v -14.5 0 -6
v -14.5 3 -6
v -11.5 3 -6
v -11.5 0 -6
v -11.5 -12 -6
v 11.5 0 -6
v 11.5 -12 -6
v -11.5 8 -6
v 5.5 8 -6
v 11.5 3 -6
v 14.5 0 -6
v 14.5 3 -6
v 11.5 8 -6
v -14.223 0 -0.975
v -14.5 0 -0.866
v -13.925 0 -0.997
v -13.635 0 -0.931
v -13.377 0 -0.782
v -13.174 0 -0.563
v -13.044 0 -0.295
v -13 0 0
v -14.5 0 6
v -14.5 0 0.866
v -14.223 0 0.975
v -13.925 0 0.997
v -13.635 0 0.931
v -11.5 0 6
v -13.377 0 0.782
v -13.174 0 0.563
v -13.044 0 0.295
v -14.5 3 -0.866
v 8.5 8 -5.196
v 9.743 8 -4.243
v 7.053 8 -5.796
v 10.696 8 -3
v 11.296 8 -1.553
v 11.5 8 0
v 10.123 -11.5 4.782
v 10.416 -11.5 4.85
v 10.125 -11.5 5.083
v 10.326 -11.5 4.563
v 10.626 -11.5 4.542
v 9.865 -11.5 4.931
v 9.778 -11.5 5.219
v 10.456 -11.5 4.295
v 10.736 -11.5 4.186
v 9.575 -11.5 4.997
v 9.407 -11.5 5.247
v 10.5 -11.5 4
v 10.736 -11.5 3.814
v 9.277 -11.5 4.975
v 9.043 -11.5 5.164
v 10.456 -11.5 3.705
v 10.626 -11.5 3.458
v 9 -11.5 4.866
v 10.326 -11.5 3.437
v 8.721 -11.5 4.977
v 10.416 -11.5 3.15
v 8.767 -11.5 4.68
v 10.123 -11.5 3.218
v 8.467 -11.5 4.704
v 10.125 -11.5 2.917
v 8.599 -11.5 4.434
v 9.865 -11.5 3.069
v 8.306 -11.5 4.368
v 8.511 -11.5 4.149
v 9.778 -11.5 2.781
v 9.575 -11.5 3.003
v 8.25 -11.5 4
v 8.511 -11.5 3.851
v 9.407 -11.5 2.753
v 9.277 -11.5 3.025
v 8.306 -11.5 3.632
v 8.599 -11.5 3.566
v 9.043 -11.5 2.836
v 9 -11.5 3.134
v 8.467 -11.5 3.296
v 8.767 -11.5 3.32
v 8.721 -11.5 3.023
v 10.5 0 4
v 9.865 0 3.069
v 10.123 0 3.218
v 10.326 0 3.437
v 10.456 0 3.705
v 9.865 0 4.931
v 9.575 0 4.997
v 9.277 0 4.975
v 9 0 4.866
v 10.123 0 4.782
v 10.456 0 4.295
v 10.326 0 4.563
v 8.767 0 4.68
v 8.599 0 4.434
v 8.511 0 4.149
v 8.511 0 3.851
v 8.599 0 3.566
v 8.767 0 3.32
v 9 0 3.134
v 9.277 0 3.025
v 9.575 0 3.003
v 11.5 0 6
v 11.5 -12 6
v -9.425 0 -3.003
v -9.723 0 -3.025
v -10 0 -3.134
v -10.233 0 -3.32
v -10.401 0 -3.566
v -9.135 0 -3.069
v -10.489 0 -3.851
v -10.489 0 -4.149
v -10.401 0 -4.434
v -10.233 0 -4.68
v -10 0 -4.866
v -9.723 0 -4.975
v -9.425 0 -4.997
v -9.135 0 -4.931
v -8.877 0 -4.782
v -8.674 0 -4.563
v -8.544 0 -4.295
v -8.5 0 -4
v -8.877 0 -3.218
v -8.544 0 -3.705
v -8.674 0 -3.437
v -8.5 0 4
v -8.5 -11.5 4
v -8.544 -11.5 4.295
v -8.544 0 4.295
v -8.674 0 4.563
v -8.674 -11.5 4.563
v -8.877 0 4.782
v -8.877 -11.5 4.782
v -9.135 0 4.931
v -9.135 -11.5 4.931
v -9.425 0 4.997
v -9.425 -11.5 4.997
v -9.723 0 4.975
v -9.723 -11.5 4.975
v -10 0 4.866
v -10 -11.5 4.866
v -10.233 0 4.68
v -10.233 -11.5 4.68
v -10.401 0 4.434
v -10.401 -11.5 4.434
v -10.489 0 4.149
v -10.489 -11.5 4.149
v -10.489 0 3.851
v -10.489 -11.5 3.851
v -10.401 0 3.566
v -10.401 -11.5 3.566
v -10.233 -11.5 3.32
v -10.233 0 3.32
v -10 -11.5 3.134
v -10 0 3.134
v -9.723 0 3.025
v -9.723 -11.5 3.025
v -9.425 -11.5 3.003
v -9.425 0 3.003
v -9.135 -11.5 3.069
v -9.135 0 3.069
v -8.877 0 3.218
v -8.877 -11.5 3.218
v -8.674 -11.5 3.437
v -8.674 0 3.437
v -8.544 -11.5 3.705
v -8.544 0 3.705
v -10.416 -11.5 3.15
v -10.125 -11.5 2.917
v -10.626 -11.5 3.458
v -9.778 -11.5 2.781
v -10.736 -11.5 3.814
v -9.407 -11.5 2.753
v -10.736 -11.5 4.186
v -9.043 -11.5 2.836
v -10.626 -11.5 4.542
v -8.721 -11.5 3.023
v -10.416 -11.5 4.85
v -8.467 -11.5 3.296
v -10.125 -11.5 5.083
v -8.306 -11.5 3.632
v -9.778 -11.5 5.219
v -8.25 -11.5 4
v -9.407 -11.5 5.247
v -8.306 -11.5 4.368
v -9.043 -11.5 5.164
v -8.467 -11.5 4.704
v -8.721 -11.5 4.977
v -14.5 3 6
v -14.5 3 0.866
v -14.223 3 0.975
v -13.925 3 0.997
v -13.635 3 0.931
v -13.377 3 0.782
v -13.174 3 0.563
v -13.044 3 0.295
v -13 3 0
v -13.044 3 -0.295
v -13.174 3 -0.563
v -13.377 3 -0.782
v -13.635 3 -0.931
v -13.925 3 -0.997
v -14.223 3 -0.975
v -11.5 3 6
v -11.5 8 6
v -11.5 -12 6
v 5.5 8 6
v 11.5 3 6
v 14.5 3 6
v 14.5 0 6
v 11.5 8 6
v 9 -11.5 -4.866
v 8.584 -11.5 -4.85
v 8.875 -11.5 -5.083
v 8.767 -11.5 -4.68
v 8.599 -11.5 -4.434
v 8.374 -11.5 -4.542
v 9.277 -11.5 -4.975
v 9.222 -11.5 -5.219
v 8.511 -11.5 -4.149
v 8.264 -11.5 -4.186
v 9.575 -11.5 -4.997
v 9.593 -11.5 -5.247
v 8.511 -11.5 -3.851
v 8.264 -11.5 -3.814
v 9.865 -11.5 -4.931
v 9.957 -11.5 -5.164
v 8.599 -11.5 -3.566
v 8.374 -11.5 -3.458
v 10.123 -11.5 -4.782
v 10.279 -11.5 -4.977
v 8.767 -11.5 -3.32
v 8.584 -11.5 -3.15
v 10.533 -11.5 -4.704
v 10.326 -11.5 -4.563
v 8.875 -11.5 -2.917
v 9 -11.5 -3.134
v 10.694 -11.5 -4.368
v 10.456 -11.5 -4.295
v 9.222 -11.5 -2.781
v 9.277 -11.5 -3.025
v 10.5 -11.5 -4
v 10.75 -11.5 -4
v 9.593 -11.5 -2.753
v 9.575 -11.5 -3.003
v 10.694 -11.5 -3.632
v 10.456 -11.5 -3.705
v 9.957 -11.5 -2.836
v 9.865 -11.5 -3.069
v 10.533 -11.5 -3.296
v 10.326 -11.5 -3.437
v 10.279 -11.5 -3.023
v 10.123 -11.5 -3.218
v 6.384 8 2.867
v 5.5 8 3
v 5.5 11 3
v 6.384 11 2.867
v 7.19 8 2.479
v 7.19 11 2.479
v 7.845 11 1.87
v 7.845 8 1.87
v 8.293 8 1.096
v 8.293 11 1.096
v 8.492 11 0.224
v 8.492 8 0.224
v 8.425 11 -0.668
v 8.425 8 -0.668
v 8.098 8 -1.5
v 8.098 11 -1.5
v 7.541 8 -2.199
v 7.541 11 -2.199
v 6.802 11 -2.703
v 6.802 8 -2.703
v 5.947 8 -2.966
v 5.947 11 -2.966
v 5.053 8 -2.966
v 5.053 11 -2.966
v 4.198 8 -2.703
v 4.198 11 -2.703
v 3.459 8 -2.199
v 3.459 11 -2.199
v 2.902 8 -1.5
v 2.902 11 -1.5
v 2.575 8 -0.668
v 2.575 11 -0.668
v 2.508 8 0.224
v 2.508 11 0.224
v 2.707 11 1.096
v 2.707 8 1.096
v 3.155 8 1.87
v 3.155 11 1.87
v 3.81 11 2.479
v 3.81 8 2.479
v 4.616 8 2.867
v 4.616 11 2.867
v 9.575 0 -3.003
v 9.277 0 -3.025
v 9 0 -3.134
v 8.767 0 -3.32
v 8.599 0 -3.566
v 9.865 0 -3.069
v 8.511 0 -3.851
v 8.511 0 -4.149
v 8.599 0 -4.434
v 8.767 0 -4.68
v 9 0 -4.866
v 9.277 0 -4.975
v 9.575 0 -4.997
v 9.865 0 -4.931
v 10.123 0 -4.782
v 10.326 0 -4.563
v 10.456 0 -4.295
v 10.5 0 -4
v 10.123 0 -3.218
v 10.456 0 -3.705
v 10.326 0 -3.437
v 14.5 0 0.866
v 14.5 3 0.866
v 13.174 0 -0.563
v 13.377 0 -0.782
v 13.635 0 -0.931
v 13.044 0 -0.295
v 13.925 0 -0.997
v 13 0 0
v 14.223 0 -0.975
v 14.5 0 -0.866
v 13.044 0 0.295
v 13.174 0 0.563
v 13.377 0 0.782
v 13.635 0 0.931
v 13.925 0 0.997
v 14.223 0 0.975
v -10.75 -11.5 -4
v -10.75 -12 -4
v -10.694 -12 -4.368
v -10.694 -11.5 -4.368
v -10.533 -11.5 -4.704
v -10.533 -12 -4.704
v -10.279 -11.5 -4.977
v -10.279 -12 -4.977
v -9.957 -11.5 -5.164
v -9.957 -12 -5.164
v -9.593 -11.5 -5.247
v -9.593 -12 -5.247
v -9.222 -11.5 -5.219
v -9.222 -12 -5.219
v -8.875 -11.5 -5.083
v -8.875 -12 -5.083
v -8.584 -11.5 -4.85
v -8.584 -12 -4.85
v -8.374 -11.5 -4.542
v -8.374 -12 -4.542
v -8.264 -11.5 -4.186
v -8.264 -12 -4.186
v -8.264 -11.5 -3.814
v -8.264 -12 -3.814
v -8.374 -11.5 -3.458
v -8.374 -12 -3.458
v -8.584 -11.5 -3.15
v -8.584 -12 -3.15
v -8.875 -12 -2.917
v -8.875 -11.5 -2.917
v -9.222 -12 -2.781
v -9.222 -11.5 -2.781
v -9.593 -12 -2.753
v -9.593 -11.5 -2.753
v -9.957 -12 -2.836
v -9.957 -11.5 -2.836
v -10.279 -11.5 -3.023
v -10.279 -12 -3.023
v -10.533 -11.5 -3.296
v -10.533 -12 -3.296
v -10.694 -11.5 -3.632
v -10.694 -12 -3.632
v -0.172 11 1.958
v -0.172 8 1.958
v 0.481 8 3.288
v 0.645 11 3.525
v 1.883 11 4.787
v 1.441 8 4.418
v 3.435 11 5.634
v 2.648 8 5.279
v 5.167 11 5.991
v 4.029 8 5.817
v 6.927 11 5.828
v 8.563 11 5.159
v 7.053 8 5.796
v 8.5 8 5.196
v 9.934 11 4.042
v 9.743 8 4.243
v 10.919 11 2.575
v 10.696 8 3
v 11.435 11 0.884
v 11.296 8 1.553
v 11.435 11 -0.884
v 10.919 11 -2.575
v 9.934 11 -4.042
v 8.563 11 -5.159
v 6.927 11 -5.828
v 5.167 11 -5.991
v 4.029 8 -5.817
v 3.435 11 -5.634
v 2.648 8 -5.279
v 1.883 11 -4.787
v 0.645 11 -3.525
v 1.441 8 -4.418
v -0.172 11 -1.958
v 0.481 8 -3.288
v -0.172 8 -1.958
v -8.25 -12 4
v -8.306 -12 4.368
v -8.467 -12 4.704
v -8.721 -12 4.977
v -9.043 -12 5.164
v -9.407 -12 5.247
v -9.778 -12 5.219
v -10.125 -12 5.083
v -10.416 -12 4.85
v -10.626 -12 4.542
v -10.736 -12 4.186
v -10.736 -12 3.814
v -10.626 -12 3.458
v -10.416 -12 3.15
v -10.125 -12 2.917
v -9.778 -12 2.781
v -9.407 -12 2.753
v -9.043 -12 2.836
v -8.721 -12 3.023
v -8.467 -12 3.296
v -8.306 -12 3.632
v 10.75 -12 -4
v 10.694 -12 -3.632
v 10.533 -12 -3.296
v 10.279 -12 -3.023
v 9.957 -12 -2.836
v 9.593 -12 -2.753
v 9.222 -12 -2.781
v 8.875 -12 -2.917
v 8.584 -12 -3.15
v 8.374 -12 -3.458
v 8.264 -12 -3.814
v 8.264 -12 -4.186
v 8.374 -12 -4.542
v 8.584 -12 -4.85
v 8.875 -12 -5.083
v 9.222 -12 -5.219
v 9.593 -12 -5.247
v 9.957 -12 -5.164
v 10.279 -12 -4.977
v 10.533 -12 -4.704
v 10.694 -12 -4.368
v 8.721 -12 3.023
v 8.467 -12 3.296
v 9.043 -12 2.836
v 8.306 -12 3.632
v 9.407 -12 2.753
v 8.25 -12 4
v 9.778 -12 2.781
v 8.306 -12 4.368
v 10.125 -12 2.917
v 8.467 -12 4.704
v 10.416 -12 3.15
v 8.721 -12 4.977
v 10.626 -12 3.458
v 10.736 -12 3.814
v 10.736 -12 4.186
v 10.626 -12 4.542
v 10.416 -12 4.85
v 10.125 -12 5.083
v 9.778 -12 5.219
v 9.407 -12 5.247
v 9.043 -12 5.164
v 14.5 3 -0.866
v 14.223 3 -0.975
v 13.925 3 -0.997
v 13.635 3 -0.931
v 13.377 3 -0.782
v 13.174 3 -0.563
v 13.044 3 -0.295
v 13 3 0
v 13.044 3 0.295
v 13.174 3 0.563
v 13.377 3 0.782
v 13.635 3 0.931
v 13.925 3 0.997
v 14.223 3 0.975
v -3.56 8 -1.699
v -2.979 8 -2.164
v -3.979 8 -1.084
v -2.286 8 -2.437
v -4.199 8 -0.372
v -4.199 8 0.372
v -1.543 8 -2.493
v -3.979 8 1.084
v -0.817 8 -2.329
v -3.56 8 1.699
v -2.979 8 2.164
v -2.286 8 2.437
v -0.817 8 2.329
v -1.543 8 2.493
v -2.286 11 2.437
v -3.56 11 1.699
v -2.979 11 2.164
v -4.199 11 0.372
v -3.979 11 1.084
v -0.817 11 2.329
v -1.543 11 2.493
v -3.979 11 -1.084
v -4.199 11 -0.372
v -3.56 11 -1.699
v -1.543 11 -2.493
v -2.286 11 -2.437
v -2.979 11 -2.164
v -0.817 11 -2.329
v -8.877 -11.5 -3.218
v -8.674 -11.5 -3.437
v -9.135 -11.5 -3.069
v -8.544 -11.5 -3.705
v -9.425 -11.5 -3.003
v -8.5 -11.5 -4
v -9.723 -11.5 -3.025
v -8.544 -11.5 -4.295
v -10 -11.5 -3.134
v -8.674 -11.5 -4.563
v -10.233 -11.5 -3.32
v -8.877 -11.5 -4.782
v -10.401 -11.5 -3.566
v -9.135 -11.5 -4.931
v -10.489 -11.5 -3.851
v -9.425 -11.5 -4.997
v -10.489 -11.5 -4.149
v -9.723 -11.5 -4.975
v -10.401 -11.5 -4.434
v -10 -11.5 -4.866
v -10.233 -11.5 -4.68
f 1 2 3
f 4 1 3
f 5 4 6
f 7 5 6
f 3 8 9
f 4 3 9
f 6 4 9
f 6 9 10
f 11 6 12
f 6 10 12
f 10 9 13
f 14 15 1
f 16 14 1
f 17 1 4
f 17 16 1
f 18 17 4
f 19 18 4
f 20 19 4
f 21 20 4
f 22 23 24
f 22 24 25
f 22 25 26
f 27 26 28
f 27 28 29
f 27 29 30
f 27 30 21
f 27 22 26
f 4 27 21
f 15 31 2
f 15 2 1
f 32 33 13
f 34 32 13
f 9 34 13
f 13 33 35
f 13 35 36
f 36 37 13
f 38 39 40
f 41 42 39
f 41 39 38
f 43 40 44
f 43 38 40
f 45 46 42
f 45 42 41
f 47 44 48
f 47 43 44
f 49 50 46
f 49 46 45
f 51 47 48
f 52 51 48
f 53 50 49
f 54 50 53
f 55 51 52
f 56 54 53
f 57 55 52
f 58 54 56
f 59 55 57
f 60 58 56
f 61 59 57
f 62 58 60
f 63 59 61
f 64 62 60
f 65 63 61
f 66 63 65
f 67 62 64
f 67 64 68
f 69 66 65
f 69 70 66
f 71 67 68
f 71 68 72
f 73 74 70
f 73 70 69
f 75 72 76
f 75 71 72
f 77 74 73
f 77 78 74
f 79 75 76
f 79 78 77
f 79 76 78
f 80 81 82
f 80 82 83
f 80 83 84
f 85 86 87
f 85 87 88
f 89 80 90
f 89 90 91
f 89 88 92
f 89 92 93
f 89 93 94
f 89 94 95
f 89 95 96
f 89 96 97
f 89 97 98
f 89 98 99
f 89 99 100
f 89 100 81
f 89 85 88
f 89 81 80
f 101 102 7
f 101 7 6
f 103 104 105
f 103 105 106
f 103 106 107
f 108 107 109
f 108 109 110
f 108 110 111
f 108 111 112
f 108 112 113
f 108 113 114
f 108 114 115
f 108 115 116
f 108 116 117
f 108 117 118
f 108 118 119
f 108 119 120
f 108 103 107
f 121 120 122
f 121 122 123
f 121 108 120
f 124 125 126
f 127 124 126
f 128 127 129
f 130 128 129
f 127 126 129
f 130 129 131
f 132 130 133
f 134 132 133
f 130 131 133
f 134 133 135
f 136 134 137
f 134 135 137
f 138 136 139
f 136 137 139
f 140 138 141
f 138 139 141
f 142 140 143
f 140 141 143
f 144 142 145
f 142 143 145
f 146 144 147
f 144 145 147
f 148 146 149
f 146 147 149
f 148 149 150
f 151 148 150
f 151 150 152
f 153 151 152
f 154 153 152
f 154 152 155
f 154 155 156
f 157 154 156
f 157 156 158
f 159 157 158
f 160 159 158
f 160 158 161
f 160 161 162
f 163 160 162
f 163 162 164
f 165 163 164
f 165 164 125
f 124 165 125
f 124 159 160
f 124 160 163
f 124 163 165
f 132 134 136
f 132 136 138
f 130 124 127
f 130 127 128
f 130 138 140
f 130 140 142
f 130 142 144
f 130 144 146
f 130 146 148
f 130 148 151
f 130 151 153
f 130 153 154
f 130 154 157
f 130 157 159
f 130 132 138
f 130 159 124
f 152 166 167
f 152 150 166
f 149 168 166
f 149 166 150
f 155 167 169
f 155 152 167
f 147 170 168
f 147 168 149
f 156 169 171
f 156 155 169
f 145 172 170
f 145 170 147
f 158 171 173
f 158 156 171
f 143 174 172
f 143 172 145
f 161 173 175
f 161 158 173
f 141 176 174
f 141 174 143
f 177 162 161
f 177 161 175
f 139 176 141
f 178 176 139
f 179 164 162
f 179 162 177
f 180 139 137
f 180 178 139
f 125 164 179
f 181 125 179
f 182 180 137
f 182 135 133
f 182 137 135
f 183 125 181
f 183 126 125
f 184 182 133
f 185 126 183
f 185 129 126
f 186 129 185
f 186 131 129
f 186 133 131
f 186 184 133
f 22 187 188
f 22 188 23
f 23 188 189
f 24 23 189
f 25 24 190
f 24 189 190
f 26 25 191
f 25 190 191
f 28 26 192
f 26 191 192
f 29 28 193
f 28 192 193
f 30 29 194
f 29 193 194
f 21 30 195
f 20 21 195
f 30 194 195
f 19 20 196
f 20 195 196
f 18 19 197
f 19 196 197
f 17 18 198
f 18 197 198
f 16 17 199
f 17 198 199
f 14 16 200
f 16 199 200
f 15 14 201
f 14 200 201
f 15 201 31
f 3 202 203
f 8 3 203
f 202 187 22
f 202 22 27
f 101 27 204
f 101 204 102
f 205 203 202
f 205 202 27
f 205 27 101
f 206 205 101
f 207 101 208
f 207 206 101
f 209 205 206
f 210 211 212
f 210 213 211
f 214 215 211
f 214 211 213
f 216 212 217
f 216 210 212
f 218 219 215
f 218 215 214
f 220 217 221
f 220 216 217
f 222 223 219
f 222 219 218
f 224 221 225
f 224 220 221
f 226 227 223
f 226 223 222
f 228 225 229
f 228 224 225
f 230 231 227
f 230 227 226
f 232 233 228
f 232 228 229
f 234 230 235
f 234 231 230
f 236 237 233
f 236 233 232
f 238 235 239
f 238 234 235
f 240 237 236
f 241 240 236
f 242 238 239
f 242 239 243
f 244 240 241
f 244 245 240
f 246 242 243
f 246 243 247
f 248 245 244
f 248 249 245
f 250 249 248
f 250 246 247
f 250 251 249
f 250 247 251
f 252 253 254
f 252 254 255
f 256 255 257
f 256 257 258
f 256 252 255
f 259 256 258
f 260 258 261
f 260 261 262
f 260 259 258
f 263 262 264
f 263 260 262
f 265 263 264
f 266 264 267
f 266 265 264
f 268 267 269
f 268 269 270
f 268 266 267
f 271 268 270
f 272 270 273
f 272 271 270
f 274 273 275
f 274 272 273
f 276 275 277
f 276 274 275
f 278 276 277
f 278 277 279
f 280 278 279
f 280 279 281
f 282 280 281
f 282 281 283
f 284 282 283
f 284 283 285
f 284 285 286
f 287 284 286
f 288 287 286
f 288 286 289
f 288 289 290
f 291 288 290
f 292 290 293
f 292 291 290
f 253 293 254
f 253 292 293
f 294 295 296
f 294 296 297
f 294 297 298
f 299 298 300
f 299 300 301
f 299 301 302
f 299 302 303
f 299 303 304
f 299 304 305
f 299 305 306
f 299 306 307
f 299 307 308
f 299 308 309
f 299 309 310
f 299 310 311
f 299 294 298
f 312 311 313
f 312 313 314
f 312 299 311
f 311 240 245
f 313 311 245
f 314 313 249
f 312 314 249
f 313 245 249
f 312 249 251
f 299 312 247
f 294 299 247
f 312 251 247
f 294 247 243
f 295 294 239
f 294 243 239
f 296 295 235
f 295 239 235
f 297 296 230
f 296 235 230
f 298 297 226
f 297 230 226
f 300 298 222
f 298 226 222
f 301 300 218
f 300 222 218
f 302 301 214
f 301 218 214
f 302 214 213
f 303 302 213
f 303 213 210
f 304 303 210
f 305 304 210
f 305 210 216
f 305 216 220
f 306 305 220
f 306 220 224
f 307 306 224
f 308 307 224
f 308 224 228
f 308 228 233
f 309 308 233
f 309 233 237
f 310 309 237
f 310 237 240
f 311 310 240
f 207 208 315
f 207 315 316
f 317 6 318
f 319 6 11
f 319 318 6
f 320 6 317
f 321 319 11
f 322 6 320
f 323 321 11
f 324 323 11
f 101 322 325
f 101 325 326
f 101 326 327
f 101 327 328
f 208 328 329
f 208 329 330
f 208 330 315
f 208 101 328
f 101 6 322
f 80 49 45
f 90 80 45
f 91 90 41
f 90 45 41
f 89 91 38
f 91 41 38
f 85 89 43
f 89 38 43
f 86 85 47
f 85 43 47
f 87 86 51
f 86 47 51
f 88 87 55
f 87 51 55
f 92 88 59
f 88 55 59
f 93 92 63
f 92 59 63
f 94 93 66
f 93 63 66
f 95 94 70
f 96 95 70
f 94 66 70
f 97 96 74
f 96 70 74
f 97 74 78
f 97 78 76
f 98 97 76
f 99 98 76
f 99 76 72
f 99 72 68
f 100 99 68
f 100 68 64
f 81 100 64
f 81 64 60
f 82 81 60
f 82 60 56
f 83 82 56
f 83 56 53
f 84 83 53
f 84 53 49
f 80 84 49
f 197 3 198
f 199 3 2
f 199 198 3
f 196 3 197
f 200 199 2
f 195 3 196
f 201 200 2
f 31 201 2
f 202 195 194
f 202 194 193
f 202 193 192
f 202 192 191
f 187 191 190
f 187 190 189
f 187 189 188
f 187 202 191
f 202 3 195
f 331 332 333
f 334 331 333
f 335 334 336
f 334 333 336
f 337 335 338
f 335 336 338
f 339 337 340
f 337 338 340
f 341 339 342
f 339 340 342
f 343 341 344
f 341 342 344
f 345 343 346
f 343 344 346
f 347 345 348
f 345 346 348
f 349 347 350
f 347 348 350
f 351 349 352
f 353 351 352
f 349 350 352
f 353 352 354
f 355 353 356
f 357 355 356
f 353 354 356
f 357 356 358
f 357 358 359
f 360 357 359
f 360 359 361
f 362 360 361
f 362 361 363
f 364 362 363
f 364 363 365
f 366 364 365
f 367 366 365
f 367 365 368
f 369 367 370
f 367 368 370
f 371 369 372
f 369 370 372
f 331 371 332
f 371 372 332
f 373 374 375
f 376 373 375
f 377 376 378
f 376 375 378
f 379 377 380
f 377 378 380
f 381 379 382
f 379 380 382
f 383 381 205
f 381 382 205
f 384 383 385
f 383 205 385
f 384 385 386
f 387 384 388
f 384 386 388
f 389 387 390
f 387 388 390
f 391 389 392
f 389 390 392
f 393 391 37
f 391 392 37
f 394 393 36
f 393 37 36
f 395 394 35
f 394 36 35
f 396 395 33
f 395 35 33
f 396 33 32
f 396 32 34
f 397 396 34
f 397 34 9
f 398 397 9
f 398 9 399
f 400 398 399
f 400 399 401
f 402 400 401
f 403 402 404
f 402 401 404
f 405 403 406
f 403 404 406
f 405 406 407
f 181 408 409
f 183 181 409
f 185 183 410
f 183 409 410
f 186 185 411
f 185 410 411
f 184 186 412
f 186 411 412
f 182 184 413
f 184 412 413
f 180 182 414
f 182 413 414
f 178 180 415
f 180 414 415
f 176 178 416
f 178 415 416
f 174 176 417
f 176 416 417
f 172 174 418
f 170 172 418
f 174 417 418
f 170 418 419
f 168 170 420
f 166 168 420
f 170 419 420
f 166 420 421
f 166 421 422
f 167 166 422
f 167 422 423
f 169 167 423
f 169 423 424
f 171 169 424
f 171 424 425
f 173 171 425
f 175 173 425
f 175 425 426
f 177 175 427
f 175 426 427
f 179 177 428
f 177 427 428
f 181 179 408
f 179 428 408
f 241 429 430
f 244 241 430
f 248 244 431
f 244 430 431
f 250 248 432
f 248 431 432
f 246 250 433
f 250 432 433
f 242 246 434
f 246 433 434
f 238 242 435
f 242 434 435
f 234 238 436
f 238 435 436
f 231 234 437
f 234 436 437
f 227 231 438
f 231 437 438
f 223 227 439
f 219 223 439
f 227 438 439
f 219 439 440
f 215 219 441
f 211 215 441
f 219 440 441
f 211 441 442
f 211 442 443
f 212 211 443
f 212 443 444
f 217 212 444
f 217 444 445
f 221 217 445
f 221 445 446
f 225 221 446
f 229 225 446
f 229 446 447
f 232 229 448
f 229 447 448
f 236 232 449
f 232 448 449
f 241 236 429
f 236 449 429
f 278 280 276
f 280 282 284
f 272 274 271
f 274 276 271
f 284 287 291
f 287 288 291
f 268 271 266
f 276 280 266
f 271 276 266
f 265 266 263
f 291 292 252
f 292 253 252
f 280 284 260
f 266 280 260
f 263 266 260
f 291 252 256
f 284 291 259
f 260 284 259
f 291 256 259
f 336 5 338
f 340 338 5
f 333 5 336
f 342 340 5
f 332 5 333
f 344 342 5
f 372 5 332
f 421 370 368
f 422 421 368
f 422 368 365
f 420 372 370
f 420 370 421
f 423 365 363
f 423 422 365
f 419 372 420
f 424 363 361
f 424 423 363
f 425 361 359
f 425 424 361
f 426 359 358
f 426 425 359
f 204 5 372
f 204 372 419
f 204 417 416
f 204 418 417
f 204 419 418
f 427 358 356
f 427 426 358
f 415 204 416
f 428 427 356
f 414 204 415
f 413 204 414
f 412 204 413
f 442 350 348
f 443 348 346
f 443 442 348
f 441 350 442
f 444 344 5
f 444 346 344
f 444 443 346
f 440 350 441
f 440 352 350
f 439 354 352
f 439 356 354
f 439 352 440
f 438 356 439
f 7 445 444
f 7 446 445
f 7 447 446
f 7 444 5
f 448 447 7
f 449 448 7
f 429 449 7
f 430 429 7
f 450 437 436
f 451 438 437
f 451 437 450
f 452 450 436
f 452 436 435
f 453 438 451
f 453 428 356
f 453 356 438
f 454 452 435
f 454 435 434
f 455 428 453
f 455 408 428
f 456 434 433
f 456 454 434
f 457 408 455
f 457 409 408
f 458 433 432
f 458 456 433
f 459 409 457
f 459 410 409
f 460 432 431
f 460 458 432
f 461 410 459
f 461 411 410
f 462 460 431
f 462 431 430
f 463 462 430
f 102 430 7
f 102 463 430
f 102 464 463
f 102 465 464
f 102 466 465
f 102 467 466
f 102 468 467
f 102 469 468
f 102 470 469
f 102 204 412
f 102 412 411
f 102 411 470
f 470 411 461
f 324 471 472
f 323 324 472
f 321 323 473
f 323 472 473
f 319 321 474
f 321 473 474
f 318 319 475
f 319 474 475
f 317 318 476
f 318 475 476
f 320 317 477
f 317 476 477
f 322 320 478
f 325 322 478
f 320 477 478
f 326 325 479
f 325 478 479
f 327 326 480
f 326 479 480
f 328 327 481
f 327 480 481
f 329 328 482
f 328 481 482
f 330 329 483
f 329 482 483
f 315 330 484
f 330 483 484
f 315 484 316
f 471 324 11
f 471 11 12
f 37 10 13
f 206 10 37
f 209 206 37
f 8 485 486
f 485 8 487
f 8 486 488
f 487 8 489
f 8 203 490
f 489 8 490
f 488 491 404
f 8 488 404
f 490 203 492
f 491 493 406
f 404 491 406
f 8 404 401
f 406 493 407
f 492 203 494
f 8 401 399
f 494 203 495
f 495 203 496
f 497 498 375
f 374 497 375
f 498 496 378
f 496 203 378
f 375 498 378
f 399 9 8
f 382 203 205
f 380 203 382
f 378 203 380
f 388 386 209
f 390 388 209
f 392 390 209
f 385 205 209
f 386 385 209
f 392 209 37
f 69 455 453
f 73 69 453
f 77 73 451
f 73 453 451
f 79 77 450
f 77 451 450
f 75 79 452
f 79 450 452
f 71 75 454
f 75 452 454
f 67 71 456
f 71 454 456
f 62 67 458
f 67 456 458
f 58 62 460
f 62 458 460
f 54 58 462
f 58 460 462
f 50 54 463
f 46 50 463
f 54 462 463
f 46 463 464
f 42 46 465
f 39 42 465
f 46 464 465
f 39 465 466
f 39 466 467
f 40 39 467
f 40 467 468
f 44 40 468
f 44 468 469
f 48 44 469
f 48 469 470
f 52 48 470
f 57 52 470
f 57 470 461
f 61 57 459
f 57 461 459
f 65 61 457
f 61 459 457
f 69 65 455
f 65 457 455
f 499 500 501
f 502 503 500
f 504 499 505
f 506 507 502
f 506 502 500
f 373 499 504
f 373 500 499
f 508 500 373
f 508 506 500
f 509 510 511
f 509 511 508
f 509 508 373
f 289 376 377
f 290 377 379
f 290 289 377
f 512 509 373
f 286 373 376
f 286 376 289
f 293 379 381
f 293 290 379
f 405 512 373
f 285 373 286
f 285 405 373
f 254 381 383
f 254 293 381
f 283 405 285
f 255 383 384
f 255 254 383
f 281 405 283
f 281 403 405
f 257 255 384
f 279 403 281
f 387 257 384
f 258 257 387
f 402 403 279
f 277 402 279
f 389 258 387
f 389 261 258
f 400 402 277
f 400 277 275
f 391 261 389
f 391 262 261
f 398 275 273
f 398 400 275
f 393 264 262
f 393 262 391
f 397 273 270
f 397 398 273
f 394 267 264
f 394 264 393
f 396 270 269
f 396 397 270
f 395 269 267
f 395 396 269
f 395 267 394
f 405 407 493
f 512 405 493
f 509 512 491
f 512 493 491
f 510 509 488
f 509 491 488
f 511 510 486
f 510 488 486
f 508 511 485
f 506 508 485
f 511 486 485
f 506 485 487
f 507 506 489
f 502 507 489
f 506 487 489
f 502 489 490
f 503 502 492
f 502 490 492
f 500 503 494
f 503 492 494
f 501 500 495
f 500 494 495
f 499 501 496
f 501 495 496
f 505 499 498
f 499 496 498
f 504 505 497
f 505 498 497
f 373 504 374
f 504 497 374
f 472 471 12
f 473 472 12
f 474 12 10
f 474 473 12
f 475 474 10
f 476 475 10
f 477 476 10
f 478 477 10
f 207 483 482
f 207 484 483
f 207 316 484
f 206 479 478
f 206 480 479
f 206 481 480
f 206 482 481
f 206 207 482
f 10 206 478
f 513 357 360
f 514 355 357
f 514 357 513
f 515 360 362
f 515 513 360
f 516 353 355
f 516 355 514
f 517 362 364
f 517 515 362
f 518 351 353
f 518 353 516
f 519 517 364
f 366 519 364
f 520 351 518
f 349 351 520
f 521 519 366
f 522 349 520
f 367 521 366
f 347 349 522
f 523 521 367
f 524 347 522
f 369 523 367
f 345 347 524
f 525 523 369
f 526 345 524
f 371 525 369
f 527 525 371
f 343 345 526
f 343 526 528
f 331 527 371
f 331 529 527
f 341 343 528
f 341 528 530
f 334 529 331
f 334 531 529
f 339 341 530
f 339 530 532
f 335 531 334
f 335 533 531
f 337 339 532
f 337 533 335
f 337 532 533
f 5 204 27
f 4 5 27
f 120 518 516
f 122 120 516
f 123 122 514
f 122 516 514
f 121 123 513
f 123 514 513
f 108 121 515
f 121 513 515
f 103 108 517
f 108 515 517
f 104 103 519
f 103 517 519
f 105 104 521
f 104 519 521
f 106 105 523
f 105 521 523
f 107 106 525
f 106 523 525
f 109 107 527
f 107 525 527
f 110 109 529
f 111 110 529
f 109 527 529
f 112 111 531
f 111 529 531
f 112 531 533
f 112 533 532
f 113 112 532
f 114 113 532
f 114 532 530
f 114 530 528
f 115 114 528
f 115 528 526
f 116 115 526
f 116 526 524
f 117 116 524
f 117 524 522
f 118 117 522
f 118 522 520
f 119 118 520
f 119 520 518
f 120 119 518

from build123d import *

# Parameters (mm, degrees)
BOSS_EXTRUDE1_DEPTH = 6
SKETCH2_R           = 1
CUT_EXTRUDE1_DEPTH  = 22.708293346
SKETCH3_R           = 1.25
SKETCH3_R_2         = 1
CUT_EXTRUDE2_DEPTH  = 0.5
SKETCH3_2_R         = 1
CUT_EXTRUDE3_DEPTH  = 12
SKETCH4_R           = 3
BOSS_EXTRUDE2_DEPTH = 3


with BuildPart() as part:
    # Sketch1 → Boss-Extrude1 (new, symmetric)
    with BuildSketch(Plane.XY):
        Polygon((-14.5, 0), (-11.5, 0), (-11.5, -12), (11.5, -12), (11.5, 0), (14.5, 0), (14.5, 3), (11.5, 3), (11.5, 8), (-11.5, 8), (-11.5, 3), (-14.5, 3), align=None)
    extrude(amount=BOSS_EXTRUDE1_DEPTH, both=True)

    # Sketch2 → Cut-Extrude1 (cut, through all)
    with BuildSketch(Plane(origin=(0, 3, 0), x_dir=(1, 0, 0), z_dir=(0, 1, 0))):
        with Locations((14, 0)):
            Circle(SKETCH2_R)
        with Locations((-14, 0)):
            Circle(SKETCH2_R)
    extrude(amount=-CUT_EXTRUDE1_DEPTH, mode=Mode.SUBTRACT)

    # Sketch3 → Cut-Extrude2 (cut)
    # profile 1 of 4: a face of its own
    with BuildSketch(Plane.XZ.offset(12)):
        with Locations((9.5, -4)):
            Circle(SKETCH3_R)
        with Locations((9.5, -4)):
            Circle(SKETCH3_R_2, mode=Mode.SUBTRACT)
    # profile 2 of 4: a face of its own
    with BuildSketch(Plane.XZ.offset(12)):
        with Locations((9.5, 4)):
            Circle(SKETCH3_R)
        with Locations((9.5, 4)):
            Circle(SKETCH3_R_2, mode=Mode.SUBTRACT)
    # profile 3 of 4: a face of its own
    with BuildSketch(Plane.XZ.offset(12)):
        with Locations((-9.5, -4)):
            Circle(SKETCH3_R)
        with Locations((-9.5, -4)):
            Circle(SKETCH3_R_2, mode=Mode.SUBTRACT)
    # profile 4 of 4: a face of its own
    with BuildSketch(Plane.XZ.offset(12)):
        with Locations((-9.5, 4)):
            Circle(SKETCH3_R)
        with Locations((-9.5, 4)):
            Circle(SKETCH3_R_2, mode=Mode.SUBTRACT)
    extrude(amount=-CUT_EXTRUDE2_DEPTH, mode=Mode.SUBTRACT)

    # Sketch3<2> → Cut-Extrude3 (cut)
    with BuildSketch(Plane.XZ.offset(12)):
        with Locations((9.5, -4)):
            Circle(SKETCH3_2_R)
        with Locations((9.5, 4)):
            Circle(SKETCH3_2_R)
        with Locations((-9.5, -4)):
            Circle(SKETCH3_2_R)
        with Locations((-9.5, 4)):
            Circle(SKETCH3_2_R)
    extrude(amount=-CUT_EXTRUDE3_DEPTH, mode=Mode.SUBTRACT)

    # Sketch4 → Boss-Extrude2 (add)
    with BuildSketch(Plane(origin=(0, 8, 0), x_dir=(1, 0, 0), z_dir=(0, 1, 0))):
        with BuildLine():
            ThreePointArc((-0.171650012, -1.957648115), (11.5, 0), (-0.171650012, 1.957648115))
            ThreePointArc((-0.171650012, 1.957648115), (-4.226517806, 0), (-0.171650012, -1.957648115))
        make_face()
        with Locations((5.5, 0)):
            Circle(SKETCH4_R, mode=Mode.SUBTRACT)
    extrude(amount=BOSS_EXTRUDE2_DEPTH)


solid = part.part
